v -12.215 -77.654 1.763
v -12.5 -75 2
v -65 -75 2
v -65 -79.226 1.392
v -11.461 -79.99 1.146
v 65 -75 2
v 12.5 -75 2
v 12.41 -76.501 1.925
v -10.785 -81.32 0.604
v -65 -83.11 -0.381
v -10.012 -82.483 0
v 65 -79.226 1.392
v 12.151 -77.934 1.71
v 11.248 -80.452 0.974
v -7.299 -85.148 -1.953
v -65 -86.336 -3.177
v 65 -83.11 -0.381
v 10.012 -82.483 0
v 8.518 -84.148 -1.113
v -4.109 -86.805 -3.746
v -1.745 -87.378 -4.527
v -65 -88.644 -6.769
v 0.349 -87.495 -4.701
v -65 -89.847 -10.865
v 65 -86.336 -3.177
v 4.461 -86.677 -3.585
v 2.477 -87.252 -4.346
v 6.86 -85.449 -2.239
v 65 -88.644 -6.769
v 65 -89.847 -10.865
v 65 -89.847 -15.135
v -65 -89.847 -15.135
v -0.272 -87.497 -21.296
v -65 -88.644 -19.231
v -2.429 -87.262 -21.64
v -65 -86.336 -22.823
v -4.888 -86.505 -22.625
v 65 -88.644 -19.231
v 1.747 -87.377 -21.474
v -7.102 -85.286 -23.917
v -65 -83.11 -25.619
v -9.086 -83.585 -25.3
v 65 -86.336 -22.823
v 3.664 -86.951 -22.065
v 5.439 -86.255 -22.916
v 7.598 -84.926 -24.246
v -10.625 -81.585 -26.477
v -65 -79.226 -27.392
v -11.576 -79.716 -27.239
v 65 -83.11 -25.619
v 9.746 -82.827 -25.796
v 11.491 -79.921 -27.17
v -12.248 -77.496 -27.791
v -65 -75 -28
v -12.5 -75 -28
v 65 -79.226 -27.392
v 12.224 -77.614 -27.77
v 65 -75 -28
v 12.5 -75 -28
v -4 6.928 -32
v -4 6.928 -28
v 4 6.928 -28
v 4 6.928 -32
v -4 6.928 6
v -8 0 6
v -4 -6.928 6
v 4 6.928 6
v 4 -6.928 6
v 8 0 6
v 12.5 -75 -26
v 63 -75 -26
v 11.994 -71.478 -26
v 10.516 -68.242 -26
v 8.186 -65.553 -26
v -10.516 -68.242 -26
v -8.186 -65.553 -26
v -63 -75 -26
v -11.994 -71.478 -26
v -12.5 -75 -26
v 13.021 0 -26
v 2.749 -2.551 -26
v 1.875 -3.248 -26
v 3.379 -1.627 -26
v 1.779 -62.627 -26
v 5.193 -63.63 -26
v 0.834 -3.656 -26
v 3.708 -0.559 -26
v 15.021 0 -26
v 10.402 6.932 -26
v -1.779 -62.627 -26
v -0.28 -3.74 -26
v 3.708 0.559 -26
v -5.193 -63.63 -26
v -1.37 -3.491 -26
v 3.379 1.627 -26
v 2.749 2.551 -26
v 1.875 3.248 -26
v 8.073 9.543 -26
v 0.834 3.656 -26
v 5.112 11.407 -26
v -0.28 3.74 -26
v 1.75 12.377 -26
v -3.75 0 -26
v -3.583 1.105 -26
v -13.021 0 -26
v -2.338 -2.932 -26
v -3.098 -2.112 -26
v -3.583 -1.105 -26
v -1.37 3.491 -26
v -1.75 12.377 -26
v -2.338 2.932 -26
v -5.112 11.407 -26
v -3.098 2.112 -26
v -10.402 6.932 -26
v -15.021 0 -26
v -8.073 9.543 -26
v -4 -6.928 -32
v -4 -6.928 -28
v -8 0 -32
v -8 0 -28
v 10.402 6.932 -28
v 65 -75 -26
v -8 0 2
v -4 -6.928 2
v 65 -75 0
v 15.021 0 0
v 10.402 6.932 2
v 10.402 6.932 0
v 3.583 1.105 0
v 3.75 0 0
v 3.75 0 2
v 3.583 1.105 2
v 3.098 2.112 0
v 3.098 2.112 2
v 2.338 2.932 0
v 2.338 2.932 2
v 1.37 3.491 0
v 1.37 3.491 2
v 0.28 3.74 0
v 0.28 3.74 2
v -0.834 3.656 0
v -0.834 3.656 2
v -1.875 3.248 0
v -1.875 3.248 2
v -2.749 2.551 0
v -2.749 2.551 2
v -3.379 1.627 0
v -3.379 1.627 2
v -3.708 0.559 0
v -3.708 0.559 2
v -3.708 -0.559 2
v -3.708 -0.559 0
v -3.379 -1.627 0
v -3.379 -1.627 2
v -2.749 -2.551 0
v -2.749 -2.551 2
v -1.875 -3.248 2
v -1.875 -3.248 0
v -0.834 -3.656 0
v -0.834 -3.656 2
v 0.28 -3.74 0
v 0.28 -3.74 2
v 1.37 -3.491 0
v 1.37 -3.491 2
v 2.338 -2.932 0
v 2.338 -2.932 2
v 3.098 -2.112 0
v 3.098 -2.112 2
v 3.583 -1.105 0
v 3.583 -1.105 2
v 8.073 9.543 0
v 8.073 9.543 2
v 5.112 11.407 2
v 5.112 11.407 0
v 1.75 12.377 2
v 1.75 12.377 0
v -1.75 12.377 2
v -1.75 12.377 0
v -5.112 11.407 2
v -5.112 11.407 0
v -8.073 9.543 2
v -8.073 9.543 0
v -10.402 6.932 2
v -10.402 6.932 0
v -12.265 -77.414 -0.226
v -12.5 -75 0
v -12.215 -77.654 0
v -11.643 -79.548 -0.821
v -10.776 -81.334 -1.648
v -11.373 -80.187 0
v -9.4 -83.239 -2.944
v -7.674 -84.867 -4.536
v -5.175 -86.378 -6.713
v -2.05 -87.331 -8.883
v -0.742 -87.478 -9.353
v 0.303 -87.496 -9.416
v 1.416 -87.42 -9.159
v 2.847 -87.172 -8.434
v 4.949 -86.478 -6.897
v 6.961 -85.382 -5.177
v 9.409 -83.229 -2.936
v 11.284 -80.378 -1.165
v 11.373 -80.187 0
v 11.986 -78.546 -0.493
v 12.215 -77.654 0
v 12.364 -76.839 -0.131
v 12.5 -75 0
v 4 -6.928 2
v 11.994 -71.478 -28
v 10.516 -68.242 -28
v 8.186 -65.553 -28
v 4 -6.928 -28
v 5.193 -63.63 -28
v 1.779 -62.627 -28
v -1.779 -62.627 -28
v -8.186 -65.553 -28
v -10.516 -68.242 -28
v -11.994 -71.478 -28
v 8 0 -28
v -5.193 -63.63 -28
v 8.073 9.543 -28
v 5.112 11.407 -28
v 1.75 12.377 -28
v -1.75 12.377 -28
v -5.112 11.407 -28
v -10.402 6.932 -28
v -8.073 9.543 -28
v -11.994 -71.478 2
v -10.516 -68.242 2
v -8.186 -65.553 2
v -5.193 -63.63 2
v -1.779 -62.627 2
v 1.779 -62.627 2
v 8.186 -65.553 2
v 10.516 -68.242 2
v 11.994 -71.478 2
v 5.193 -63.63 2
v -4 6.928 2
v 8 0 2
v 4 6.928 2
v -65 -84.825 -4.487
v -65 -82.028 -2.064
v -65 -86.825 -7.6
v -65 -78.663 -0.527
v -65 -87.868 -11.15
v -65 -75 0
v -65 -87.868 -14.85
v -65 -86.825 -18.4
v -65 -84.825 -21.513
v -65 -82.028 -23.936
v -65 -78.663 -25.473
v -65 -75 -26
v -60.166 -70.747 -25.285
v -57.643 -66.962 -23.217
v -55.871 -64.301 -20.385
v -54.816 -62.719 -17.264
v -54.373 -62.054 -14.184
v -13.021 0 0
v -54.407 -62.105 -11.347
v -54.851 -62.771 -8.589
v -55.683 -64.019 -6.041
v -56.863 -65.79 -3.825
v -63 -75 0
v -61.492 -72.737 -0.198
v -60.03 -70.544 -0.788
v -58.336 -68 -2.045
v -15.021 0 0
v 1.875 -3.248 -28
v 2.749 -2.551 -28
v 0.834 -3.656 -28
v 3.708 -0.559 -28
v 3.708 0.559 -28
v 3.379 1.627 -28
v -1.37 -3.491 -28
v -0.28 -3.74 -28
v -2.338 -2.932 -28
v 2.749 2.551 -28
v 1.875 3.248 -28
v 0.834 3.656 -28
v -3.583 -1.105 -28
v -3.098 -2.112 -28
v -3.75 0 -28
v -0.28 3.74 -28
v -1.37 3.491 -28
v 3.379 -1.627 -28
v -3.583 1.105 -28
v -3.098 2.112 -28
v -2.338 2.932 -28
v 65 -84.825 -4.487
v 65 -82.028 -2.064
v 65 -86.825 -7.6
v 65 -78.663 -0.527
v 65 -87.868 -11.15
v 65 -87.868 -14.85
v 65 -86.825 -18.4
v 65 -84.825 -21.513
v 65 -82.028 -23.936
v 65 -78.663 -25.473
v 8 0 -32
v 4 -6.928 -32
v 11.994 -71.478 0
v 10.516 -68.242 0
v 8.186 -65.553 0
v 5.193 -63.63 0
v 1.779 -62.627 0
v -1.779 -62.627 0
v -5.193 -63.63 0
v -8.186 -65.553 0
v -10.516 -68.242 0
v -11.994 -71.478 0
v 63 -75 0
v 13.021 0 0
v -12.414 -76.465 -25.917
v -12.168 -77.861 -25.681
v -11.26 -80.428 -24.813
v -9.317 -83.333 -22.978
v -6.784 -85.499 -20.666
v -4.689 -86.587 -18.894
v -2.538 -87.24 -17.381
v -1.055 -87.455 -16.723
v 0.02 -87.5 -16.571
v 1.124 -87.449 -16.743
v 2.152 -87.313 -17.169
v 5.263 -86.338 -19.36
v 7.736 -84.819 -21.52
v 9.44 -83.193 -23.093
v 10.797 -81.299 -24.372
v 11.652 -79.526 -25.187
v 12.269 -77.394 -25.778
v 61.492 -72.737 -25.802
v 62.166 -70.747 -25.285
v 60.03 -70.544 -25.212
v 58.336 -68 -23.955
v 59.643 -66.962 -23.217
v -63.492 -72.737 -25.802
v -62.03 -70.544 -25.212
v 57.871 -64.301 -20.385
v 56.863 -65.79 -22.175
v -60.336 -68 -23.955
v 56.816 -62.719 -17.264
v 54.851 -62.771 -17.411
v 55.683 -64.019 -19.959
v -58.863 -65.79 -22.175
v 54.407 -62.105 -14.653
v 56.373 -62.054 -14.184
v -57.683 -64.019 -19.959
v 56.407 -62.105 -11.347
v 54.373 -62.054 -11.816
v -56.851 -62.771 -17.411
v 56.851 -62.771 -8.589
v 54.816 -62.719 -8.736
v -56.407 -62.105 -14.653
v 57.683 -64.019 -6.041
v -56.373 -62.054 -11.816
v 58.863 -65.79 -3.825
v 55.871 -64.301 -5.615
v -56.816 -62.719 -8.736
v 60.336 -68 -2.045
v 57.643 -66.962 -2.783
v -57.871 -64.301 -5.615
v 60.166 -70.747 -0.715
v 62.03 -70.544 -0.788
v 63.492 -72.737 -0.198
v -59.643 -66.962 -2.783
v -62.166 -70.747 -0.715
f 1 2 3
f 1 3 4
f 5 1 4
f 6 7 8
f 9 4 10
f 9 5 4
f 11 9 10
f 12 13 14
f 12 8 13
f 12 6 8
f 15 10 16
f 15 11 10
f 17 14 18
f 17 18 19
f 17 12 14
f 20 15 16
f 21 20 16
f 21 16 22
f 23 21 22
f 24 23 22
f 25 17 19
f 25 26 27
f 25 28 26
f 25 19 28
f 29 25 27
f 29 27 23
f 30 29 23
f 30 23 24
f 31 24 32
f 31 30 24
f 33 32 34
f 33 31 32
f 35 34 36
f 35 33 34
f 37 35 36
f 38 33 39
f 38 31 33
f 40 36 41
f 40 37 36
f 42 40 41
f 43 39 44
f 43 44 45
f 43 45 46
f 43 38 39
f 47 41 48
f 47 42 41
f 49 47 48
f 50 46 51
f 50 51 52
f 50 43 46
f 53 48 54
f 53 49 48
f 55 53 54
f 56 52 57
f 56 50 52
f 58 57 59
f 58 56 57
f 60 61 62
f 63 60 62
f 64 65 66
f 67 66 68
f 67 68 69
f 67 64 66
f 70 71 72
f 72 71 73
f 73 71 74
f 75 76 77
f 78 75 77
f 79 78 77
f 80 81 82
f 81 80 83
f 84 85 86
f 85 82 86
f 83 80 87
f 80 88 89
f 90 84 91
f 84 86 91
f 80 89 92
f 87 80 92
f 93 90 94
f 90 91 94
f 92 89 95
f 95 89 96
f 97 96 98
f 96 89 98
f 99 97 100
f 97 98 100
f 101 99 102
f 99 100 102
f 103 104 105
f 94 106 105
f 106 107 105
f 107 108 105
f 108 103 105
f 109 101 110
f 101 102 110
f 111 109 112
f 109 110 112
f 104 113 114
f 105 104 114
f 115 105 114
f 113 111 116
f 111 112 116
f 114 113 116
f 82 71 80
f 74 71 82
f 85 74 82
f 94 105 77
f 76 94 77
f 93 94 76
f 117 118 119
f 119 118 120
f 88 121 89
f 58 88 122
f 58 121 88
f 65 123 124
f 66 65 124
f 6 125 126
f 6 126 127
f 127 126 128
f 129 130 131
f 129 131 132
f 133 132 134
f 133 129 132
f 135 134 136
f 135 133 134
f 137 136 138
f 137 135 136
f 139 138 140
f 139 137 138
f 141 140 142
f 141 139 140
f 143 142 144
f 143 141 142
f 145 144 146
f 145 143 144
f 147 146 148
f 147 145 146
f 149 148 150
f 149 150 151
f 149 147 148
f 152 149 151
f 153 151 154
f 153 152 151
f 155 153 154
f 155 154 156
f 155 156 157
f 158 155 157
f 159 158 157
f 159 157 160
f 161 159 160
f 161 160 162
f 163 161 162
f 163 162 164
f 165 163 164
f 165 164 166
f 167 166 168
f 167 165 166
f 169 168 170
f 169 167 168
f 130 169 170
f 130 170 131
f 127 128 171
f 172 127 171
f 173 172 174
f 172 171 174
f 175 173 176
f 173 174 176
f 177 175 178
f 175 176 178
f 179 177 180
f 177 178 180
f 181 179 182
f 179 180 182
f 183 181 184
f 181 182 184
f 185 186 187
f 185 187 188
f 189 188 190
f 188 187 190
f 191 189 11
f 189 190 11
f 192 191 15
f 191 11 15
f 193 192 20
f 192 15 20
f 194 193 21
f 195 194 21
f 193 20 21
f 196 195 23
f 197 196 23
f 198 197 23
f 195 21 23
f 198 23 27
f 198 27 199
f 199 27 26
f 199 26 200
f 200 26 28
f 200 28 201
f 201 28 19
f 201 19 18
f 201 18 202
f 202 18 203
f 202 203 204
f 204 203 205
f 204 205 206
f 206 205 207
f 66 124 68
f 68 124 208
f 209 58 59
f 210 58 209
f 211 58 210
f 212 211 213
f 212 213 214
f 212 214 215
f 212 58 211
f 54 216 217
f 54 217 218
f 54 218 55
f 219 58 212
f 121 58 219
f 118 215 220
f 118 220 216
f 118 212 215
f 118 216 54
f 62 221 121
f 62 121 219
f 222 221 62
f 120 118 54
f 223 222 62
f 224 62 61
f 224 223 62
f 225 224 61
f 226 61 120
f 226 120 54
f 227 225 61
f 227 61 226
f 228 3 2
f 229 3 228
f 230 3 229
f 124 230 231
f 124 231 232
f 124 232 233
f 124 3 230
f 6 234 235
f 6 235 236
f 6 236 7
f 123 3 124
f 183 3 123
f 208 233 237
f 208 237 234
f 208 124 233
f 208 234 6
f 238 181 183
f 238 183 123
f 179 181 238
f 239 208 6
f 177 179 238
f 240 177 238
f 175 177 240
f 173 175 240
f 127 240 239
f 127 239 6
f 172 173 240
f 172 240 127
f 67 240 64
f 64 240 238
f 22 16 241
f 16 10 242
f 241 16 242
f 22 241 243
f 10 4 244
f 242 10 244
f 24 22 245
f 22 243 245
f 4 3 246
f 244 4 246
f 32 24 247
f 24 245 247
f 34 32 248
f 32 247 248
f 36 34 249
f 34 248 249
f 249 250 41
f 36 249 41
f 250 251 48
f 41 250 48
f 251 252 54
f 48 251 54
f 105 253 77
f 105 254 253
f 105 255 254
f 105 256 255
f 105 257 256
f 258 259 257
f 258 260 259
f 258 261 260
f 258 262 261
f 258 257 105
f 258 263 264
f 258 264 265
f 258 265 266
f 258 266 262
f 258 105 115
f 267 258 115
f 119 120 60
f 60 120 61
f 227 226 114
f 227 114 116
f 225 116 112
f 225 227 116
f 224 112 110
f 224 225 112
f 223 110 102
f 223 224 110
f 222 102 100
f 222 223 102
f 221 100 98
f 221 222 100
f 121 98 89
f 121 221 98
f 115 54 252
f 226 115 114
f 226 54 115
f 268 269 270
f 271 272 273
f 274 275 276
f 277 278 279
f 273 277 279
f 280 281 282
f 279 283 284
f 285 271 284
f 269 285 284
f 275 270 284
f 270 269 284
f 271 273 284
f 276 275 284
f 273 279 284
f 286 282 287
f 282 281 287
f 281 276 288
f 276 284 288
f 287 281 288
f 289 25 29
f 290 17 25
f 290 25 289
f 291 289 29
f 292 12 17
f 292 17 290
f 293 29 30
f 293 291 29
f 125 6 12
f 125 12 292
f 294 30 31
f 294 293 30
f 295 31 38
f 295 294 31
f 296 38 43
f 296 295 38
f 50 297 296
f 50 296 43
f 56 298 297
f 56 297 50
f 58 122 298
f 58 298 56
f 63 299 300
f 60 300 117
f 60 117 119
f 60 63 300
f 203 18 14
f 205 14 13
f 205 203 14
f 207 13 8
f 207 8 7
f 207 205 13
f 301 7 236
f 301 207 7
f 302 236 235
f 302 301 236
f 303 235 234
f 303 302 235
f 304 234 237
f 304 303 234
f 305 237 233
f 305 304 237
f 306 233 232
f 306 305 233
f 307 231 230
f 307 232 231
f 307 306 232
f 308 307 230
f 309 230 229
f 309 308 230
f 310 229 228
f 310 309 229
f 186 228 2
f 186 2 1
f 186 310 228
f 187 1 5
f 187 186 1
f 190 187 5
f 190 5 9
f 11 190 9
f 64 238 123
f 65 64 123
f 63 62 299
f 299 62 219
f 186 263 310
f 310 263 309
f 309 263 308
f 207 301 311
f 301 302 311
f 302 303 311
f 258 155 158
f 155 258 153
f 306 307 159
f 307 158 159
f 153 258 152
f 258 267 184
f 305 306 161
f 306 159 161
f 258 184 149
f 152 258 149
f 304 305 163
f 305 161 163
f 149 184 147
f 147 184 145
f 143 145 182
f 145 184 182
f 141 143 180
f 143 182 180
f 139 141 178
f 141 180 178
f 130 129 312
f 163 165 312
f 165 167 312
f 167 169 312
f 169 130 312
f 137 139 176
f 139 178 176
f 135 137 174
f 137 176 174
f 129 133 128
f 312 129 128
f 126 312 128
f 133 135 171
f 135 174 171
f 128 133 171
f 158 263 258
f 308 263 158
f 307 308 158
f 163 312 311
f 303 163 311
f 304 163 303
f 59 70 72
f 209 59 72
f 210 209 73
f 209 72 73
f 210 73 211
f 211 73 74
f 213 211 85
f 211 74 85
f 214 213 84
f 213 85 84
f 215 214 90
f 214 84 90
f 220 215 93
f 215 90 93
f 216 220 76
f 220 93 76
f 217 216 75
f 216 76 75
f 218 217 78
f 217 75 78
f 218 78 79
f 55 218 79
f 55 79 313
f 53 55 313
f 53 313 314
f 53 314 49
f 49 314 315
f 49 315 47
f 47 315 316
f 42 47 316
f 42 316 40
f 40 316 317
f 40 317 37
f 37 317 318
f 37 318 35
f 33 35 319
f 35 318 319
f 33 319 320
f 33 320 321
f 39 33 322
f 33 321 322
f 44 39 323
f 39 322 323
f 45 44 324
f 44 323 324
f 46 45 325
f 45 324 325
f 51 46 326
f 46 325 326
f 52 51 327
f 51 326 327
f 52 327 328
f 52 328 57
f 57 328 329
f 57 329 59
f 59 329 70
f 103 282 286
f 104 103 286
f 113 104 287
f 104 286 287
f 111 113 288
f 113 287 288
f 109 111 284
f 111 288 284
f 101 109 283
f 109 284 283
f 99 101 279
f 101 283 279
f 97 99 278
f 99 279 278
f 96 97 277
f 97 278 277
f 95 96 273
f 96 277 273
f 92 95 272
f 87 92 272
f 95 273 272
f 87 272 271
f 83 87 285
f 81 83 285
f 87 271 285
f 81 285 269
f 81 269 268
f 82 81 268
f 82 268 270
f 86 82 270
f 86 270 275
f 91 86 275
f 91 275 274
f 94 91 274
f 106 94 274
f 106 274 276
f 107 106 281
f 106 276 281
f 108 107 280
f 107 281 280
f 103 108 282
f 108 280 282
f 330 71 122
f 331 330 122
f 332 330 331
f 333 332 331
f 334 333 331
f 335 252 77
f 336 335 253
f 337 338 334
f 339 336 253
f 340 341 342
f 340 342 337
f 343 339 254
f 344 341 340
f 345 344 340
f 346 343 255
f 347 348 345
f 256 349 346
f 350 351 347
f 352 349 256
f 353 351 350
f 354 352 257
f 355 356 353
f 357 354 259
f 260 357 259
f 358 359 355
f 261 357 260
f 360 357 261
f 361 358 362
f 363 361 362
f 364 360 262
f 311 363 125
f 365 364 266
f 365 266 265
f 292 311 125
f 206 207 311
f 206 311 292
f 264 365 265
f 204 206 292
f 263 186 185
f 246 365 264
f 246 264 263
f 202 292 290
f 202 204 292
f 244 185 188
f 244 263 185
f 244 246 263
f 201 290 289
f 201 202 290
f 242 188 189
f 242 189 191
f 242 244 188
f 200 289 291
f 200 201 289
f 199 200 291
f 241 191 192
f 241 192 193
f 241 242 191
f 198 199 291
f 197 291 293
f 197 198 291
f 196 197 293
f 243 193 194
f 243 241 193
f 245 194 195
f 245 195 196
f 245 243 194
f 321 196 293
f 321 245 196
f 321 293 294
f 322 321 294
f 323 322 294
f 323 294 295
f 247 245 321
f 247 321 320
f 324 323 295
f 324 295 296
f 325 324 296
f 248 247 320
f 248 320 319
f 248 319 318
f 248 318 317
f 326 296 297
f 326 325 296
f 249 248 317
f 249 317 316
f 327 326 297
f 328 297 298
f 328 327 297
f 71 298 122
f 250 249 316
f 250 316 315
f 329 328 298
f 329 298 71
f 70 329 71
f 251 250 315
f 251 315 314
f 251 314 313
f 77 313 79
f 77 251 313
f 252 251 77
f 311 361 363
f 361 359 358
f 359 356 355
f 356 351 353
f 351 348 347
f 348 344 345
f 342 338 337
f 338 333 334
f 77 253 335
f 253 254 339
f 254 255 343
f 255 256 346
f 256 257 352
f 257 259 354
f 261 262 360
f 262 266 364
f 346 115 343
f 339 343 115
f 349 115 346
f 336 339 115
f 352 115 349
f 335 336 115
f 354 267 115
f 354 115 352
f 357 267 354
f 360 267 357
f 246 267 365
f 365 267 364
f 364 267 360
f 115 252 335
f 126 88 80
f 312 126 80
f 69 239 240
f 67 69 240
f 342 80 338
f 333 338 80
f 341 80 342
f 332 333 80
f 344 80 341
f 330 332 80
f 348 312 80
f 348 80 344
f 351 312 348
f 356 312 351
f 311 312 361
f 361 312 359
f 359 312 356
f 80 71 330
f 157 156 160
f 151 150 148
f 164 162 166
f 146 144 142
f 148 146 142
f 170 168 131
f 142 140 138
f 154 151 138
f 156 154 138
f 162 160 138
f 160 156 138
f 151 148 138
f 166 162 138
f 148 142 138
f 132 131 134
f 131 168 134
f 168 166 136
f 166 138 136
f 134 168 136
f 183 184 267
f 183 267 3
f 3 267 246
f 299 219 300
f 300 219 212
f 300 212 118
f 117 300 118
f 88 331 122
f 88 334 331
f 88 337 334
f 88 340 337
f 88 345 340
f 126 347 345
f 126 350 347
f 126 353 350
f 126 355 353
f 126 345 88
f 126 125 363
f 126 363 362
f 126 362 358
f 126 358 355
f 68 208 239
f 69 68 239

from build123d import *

# Parameters (mm, degrees)
SKETCH1_R                = 3.75
BOSS_EXTRUDE1_DEPTH      = 2
BOSS_EXTRUDE2_DEPTH      = 65
BOSS_EXTRUDE2_DEPTH_BACK = 65
SKETCH4_R                = 12.5
SKETCH4_R_2              = 3.75
BOSS_EXTRUDE3_DEPTH      = 2
SKETCH5_R                = 12.5
CUT_EXTRUDE1_DEPTH       = 3
CUT_EXTRUDE1_DEPTH_BACK  = 29
BOSS_EXTRUDE4_DEPTH      = 26
SKETCH7_R                = 13
CUT_EXTRUDE2_DEPTH       = 66.0000001
CUT_EXTRUDE2_DEPTH_BACK  = 66.0000001
BOSS_EXTRUDE5_DEPTH      = 4
BOSS_EXTRUDE6_DEPTH      = 4


with BuildPart() as part:
    # Sketch1 → Boss-Extrude1 (new body)
    with BuildSketch(Plane.XY):
        with BuildLine():
            Line((-10.40198382, 6.931719311), (-65, -75))
            Line((-65, -75), (65, -75))
            Line((65, -75), (10.40198382, 6.931719311))
            ThreePointArc((10.40198382, 6.931719311), (0, 12.5), (-10.40198382, 6.931719311))
        make_face()
        Circle(SKETCH1_R, mode=Mode.SUBTRACT)
    extrude(amount=BOSS_EXTRUDE1_DEPTH)

    # Sketch2 → Boss-Extrude2 (add, two sides)
    with BuildSketch(Plane(origin=(0, 0, 0), x_dir=(0, 0, -1), z_dir=(1, 0, 0))) as boss_extrude2_sk:
        with BuildLine():
            Line((0, -75), (-2, -75))
            ThreePointArc((-2, -75), (13, -90), (28, -75))
            Line((28, -75), (26, -75))
            ThreePointArc((26, -75), (13, -88), (0, -75))
        make_face()
    extrude(amount=BOSS_EXTRUDE2_DEPTH)
    extrude(boss_extrude2_sk.sketch, amount=-BOSS_EXTRUDE2_DEPTH_BACK)

    # Sketch4 → Boss-Extrude3 (add)
    with BuildSketch(Plane(origin=(0, 0, -28), x_dir=(-1, 0, 0), z_dir=(0, 0, -1))):
        with BuildLine():
            ThreePointArc((12.5, 0), (-3.621132575, -11.964004299), (-10.40198382, 6.931719311))
            Line((-10.40198382, 6.931719311), (-65, -75))
            Line((-65, -75), (65, -75))
            Line((65, -75), (10.40198382, 6.931719311))
            ThreePointArc((10.40198382, 6.931719311), (11.964004299, 3.621132575), (12.5, 0))
        make_face()
        Circle(SKETCH4_R)
        Circle(SKETCH4_R_2, mode=Mode.SUBTRACT)
    extrude(amount=-BOSS_EXTRUDE3_DEPTH)

    # Sketch5 → Cut-Extrude1 (cut, two sides)
    with BuildSketch(Plane.XY) as cut_extrude1_sk:
        with Locations((0, -75)):
            Circle(SKETCH5_R)
    extrude(amount=CUT_EXTRUDE1_DEPTH, mode=Mode.SUBTRACT)
    extrude(cut_extrude1_sk.sketch, amount=-CUT_EXTRUDE1_DEPTH_BACK, mode=Mode.SUBTRACT)

    # Sketch6 → Boss-Extrude4 (add)
    with BuildSketch(Plane.XY):
        Polygon((15.021173144, 0), (13.021173144, 0), (63, -75), (65, -75), align=None)
        Polygon((-13.021173144, 0), (-15.021173144, 0), (-65, -75), (-63, -75), align=None)
    extrude(amount=-BOSS_EXTRUDE4_DEPTH)

    # Sketch7 → Cut-Extrude2 (cut, two sides)
    with BuildSketch(Plane(origin=(0, 0, 0), x_dir=(0, 0, -1), z_dir=(1, 0, 0))) as cut_extrude2_sk:
        with Locations((13, -75)):
            Circle(SKETCH7_R)
    extrude(amount=CUT_EXTRUDE2_DEPTH, mode=Mode.SUBTRACT)
    extrude(cut_extrude2_sk.sketch, amount=-CUT_EXTRUDE2_DEPTH_BACK, mode=Mode.SUBTRACT)

    # Sketch8 → Boss-Extrude5 (add)
    with BuildSketch(Plane(origin=(0, 0, -28), x_dir=(-1, 0, 0), z_dir=(0, 0, -1))):
        Polygon((8, 0), (4, 6.92820323), (-4, 6.92820323), (-8, 0), (-4, -6.92820323), (4, -6.92820323), align=None)
    extrude(amount=BOSS_EXTRUDE5_DEPTH)

    # Sketch9 → Boss-Extrude6 (add)
    with BuildSketch(Plane.XY.offset(2)):
        Polygon((8, 0), (4, 6.92820323), (-4, 6.92820323), (-8, 0), (-4, -6.92820323), (4, -6.92820323), align=None)
    extrude(amount=BOSS_EXTRUDE6_DEPTH)


solid = part.part
